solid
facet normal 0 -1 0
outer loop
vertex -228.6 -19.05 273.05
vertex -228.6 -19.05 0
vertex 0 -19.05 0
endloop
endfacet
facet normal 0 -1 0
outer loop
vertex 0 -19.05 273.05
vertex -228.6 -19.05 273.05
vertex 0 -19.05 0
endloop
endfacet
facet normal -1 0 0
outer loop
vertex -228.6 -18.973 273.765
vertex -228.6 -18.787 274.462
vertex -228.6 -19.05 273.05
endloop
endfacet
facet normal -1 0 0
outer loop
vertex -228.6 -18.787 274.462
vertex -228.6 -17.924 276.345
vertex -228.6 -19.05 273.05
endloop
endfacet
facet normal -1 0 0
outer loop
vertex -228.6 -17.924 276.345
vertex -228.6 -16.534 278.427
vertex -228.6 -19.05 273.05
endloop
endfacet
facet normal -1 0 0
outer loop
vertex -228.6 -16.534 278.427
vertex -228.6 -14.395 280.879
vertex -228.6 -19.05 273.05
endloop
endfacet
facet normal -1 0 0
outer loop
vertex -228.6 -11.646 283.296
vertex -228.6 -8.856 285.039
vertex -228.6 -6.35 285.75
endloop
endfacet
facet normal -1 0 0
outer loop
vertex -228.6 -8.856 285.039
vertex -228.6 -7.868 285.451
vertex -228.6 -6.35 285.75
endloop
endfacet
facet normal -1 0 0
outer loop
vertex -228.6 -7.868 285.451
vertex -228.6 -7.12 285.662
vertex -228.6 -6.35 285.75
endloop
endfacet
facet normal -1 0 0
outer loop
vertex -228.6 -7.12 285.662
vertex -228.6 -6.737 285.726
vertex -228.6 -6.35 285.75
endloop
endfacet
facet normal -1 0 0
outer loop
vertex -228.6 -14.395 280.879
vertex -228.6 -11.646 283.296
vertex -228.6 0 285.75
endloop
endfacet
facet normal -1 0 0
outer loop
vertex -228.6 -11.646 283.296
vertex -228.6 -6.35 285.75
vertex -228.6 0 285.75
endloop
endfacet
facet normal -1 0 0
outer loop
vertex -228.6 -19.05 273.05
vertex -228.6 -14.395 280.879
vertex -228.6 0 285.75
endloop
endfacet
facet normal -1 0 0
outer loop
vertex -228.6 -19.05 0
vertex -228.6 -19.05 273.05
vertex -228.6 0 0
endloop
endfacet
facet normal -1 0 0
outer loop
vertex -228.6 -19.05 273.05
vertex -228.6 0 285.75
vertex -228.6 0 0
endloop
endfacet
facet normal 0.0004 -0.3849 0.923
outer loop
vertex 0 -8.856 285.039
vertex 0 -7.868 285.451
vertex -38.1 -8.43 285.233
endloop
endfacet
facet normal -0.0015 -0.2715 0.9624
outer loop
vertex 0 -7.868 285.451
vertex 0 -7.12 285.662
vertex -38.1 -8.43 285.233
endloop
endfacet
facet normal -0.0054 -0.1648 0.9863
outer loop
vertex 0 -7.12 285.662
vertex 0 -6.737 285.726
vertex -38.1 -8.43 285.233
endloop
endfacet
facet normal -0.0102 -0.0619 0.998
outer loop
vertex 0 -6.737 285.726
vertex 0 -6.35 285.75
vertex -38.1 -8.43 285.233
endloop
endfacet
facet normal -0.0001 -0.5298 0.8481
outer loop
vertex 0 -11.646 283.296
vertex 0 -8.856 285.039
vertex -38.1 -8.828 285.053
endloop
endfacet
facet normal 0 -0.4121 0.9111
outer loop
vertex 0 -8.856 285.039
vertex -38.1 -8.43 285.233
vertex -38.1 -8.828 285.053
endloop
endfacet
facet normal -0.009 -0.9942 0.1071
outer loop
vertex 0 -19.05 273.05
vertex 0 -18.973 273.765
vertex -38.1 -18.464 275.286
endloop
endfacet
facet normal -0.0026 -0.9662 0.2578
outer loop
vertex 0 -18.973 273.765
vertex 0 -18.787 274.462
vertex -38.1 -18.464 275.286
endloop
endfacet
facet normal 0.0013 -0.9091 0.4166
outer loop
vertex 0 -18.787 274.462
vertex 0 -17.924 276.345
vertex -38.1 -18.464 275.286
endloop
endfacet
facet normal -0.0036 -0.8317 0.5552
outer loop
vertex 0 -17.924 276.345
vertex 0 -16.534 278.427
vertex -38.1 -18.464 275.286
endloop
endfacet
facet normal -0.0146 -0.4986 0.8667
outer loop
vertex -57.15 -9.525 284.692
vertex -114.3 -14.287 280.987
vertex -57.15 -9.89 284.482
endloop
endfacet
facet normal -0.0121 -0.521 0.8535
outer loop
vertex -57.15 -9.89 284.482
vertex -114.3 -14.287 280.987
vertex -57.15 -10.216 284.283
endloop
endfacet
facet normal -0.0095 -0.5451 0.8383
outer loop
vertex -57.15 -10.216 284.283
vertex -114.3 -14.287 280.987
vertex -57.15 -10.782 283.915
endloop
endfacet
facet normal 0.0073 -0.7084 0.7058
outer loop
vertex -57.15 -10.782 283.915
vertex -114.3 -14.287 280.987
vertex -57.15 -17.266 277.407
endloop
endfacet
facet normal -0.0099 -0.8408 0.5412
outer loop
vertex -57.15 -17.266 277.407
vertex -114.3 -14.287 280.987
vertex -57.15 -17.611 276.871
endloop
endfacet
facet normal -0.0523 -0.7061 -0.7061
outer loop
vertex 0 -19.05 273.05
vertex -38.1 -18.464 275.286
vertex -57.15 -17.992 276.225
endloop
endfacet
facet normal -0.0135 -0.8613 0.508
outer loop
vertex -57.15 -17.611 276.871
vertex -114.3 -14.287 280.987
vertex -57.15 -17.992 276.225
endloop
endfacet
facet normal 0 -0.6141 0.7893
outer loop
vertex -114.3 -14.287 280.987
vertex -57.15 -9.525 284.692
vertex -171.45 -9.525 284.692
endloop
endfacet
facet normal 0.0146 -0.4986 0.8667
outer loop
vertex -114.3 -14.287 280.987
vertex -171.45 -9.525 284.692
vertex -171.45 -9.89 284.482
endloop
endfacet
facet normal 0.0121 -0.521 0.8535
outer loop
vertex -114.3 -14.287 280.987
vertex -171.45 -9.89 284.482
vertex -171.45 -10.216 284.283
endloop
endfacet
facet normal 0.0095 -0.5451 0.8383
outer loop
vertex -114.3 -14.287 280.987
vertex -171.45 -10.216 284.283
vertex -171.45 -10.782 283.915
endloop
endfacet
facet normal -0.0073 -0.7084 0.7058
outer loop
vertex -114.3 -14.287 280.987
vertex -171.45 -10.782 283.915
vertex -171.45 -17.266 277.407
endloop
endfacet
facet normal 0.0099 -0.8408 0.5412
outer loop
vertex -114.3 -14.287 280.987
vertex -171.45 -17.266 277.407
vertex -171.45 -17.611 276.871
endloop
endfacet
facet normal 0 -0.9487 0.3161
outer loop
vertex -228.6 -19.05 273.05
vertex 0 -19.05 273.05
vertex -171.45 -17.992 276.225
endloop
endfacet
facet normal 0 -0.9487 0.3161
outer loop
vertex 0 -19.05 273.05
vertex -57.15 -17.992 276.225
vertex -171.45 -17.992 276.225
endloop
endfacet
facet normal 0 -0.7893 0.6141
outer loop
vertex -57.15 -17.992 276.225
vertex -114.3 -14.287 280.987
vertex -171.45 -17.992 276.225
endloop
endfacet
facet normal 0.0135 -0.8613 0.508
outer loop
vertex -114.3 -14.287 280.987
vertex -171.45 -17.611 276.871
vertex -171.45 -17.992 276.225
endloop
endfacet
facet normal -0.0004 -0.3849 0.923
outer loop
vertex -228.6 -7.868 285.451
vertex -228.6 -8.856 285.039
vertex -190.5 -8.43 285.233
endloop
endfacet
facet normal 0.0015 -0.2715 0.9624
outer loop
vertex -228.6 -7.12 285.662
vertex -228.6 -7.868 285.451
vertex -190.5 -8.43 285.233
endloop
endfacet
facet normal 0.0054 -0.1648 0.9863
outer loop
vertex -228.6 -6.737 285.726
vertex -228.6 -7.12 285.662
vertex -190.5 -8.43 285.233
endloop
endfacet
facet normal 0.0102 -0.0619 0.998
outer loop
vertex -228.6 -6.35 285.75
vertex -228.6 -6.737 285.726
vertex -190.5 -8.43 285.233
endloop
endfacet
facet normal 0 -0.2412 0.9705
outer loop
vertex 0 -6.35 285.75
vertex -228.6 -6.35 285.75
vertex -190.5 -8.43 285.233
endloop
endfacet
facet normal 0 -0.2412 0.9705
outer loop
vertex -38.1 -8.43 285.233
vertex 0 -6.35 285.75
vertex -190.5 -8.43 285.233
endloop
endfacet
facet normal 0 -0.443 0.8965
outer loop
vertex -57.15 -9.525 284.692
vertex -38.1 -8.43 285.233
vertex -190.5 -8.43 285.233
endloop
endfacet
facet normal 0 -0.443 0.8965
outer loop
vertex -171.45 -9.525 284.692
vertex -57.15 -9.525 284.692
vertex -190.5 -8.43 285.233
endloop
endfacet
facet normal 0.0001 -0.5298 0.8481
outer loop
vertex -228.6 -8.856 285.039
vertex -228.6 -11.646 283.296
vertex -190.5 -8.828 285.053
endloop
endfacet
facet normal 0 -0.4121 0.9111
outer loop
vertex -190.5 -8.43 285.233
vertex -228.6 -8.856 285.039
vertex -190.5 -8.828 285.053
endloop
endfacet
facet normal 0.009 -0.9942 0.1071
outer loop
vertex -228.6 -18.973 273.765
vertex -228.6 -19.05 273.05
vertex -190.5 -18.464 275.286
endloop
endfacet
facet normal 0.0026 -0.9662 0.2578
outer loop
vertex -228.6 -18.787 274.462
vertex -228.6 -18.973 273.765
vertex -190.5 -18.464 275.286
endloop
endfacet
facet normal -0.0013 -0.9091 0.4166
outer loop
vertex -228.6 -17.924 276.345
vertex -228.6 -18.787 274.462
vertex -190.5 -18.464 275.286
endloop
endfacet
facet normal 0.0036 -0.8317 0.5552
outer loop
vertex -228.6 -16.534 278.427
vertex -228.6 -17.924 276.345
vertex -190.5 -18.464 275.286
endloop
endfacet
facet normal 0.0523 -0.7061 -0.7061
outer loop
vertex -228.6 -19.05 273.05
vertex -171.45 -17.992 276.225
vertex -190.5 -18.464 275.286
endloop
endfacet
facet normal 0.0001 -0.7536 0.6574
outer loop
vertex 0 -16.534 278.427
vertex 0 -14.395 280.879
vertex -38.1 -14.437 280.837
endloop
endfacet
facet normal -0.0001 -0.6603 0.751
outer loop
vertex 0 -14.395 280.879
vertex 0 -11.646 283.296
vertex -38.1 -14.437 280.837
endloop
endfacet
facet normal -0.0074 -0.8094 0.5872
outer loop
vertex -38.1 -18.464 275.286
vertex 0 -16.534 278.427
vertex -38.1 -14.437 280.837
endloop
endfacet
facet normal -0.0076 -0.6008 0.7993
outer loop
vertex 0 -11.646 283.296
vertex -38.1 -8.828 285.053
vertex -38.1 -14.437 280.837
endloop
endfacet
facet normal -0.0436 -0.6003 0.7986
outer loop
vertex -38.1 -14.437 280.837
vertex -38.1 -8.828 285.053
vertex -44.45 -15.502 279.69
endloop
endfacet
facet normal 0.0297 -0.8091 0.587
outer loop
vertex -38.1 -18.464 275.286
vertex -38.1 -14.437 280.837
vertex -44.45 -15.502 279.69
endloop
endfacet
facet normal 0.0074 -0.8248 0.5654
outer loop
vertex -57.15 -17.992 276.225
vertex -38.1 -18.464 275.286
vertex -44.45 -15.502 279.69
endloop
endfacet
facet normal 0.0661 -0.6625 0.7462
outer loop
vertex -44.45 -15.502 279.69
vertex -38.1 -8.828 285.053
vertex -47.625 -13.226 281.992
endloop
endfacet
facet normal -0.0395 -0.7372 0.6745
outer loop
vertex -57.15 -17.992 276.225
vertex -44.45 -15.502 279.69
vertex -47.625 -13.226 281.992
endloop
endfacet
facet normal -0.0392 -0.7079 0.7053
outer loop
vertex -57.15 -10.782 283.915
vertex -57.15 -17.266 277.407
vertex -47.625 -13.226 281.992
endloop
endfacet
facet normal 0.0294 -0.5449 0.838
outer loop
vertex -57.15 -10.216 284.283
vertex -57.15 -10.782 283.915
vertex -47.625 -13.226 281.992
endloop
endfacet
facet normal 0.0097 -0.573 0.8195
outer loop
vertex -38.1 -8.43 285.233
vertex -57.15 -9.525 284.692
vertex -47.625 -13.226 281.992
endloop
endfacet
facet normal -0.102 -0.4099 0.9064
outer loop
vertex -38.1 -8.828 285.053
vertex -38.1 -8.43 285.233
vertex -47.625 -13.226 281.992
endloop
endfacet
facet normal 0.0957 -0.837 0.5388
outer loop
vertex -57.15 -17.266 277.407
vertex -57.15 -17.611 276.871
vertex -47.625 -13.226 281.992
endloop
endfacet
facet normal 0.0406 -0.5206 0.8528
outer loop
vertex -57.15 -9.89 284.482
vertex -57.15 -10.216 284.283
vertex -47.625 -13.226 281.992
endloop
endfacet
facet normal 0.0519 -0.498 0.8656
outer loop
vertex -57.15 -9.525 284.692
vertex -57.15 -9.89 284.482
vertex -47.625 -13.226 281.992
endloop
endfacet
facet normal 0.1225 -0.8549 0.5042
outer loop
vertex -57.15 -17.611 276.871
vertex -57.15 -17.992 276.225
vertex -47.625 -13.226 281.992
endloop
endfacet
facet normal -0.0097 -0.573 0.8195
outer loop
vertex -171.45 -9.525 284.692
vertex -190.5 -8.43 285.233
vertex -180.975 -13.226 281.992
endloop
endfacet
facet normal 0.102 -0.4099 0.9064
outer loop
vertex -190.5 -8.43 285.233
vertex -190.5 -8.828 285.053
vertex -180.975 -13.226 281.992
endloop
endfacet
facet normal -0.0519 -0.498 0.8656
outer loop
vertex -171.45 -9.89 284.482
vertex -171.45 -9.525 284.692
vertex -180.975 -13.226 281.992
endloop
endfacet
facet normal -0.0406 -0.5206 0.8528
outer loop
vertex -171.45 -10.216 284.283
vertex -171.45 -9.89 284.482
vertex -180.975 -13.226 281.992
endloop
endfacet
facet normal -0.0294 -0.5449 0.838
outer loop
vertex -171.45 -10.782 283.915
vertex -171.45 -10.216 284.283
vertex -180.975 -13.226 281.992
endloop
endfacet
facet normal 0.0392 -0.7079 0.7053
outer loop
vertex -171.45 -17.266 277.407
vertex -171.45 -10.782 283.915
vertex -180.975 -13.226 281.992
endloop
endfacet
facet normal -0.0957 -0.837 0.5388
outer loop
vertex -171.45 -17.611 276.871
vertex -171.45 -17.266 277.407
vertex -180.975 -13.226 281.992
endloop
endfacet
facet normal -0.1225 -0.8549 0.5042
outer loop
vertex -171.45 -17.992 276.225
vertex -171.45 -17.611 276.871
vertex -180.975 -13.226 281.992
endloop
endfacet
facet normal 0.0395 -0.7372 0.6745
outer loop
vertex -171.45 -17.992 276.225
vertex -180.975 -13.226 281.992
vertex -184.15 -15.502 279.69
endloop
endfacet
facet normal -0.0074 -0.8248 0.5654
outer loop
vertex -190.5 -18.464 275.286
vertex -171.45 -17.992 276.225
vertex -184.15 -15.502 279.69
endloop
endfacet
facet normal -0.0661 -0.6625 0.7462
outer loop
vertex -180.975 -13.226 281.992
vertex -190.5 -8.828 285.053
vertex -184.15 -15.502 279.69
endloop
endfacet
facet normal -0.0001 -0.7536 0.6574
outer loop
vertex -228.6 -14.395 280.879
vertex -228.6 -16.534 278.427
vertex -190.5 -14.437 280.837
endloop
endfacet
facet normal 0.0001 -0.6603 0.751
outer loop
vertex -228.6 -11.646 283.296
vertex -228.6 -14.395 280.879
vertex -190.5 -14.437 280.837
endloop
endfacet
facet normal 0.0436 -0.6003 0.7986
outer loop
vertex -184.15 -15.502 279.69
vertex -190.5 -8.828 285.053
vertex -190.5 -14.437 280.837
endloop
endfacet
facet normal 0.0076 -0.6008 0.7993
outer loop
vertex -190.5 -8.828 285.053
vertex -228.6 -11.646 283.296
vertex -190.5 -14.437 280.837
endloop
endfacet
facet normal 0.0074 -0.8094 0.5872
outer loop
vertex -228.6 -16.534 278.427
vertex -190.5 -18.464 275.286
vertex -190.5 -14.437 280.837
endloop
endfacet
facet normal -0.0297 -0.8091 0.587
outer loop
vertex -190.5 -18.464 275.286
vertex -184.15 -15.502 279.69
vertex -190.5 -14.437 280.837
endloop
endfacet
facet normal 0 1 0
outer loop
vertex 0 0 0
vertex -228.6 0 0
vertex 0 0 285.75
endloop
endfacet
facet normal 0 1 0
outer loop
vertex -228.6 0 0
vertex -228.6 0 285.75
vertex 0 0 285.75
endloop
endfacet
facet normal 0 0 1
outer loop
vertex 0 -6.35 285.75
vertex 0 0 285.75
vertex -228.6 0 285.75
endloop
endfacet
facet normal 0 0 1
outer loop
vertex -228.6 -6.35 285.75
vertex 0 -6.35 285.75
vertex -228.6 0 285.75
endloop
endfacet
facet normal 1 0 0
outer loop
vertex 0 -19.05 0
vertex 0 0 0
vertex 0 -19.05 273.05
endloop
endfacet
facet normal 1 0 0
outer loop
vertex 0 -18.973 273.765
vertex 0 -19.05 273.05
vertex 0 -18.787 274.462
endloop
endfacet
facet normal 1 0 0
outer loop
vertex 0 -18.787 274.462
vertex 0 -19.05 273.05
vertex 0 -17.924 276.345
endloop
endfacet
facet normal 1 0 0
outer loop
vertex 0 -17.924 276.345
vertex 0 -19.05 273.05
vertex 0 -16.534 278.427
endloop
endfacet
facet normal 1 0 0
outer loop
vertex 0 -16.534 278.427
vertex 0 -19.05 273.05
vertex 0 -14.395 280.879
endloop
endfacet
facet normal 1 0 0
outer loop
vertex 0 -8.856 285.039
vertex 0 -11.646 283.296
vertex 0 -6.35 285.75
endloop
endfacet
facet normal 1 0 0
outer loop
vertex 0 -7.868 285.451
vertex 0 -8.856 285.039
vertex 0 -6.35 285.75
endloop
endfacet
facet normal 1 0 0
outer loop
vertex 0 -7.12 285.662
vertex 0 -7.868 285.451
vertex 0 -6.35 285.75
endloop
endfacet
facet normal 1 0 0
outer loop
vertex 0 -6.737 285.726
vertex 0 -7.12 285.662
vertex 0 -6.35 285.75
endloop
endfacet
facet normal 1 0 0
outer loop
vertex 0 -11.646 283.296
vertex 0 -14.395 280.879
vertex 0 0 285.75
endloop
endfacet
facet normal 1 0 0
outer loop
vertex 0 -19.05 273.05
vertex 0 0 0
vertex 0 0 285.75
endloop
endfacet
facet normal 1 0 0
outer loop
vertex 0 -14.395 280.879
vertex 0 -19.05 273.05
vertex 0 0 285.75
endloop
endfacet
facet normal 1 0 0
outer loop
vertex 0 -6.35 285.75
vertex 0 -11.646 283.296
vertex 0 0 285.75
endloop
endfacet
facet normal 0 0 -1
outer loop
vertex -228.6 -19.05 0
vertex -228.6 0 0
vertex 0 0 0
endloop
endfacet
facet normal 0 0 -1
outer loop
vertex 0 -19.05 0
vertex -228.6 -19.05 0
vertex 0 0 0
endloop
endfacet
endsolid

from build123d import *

# Parameters (mm, degrees)
F1_DEPTH    = 19.05
F2_T1_DEPTH = 292.1


# Not quite as in the source:
# - a fillet or chamfer that OpenCascade refuses, or shapes differently, is made with other operations: its cross-section is extruded or revolved along the edge and cut away or added
# - a feature names something its author has since deleted; it is built from what else it names


with BuildPart() as f1:
    # F0 (on Front) → F1 (new body)
    with BuildSketch(Plane.XZ):
        Polygon((-228.6, 0), (0, 0), (0, 228.6), (0, 285.75), (-228.6, 285.75), (-228.6, 228.6), align=None)
    extrude(amount=F1_DEPTH)

    # F2: fillet of radius 12.7 on 1 edges, made by hand

    # F2_s2 → F2_t1 (cut)
    with BuildSketch(Plane.YZ.offset(-260.35)):
        with BuildLine():
            add(Edge.make_bspline(
                [(-6.35, 285.75), (-19.05, 285.75), (-19.05, 273.05)],
                knots=[0, 0, 0, 1, 1, 1], degree=2, weights=[1, 0.3333333333, 1]))
            Line((-19.05, 273.05), (-19.05, 285.75))
            Line((-19.05, 285.75), (-6.35, 285.75))
        make_face()
    extrude(amount=F2_T1_DEPTH, mode=Mode.SUBTRACT)


solid = f1.part
